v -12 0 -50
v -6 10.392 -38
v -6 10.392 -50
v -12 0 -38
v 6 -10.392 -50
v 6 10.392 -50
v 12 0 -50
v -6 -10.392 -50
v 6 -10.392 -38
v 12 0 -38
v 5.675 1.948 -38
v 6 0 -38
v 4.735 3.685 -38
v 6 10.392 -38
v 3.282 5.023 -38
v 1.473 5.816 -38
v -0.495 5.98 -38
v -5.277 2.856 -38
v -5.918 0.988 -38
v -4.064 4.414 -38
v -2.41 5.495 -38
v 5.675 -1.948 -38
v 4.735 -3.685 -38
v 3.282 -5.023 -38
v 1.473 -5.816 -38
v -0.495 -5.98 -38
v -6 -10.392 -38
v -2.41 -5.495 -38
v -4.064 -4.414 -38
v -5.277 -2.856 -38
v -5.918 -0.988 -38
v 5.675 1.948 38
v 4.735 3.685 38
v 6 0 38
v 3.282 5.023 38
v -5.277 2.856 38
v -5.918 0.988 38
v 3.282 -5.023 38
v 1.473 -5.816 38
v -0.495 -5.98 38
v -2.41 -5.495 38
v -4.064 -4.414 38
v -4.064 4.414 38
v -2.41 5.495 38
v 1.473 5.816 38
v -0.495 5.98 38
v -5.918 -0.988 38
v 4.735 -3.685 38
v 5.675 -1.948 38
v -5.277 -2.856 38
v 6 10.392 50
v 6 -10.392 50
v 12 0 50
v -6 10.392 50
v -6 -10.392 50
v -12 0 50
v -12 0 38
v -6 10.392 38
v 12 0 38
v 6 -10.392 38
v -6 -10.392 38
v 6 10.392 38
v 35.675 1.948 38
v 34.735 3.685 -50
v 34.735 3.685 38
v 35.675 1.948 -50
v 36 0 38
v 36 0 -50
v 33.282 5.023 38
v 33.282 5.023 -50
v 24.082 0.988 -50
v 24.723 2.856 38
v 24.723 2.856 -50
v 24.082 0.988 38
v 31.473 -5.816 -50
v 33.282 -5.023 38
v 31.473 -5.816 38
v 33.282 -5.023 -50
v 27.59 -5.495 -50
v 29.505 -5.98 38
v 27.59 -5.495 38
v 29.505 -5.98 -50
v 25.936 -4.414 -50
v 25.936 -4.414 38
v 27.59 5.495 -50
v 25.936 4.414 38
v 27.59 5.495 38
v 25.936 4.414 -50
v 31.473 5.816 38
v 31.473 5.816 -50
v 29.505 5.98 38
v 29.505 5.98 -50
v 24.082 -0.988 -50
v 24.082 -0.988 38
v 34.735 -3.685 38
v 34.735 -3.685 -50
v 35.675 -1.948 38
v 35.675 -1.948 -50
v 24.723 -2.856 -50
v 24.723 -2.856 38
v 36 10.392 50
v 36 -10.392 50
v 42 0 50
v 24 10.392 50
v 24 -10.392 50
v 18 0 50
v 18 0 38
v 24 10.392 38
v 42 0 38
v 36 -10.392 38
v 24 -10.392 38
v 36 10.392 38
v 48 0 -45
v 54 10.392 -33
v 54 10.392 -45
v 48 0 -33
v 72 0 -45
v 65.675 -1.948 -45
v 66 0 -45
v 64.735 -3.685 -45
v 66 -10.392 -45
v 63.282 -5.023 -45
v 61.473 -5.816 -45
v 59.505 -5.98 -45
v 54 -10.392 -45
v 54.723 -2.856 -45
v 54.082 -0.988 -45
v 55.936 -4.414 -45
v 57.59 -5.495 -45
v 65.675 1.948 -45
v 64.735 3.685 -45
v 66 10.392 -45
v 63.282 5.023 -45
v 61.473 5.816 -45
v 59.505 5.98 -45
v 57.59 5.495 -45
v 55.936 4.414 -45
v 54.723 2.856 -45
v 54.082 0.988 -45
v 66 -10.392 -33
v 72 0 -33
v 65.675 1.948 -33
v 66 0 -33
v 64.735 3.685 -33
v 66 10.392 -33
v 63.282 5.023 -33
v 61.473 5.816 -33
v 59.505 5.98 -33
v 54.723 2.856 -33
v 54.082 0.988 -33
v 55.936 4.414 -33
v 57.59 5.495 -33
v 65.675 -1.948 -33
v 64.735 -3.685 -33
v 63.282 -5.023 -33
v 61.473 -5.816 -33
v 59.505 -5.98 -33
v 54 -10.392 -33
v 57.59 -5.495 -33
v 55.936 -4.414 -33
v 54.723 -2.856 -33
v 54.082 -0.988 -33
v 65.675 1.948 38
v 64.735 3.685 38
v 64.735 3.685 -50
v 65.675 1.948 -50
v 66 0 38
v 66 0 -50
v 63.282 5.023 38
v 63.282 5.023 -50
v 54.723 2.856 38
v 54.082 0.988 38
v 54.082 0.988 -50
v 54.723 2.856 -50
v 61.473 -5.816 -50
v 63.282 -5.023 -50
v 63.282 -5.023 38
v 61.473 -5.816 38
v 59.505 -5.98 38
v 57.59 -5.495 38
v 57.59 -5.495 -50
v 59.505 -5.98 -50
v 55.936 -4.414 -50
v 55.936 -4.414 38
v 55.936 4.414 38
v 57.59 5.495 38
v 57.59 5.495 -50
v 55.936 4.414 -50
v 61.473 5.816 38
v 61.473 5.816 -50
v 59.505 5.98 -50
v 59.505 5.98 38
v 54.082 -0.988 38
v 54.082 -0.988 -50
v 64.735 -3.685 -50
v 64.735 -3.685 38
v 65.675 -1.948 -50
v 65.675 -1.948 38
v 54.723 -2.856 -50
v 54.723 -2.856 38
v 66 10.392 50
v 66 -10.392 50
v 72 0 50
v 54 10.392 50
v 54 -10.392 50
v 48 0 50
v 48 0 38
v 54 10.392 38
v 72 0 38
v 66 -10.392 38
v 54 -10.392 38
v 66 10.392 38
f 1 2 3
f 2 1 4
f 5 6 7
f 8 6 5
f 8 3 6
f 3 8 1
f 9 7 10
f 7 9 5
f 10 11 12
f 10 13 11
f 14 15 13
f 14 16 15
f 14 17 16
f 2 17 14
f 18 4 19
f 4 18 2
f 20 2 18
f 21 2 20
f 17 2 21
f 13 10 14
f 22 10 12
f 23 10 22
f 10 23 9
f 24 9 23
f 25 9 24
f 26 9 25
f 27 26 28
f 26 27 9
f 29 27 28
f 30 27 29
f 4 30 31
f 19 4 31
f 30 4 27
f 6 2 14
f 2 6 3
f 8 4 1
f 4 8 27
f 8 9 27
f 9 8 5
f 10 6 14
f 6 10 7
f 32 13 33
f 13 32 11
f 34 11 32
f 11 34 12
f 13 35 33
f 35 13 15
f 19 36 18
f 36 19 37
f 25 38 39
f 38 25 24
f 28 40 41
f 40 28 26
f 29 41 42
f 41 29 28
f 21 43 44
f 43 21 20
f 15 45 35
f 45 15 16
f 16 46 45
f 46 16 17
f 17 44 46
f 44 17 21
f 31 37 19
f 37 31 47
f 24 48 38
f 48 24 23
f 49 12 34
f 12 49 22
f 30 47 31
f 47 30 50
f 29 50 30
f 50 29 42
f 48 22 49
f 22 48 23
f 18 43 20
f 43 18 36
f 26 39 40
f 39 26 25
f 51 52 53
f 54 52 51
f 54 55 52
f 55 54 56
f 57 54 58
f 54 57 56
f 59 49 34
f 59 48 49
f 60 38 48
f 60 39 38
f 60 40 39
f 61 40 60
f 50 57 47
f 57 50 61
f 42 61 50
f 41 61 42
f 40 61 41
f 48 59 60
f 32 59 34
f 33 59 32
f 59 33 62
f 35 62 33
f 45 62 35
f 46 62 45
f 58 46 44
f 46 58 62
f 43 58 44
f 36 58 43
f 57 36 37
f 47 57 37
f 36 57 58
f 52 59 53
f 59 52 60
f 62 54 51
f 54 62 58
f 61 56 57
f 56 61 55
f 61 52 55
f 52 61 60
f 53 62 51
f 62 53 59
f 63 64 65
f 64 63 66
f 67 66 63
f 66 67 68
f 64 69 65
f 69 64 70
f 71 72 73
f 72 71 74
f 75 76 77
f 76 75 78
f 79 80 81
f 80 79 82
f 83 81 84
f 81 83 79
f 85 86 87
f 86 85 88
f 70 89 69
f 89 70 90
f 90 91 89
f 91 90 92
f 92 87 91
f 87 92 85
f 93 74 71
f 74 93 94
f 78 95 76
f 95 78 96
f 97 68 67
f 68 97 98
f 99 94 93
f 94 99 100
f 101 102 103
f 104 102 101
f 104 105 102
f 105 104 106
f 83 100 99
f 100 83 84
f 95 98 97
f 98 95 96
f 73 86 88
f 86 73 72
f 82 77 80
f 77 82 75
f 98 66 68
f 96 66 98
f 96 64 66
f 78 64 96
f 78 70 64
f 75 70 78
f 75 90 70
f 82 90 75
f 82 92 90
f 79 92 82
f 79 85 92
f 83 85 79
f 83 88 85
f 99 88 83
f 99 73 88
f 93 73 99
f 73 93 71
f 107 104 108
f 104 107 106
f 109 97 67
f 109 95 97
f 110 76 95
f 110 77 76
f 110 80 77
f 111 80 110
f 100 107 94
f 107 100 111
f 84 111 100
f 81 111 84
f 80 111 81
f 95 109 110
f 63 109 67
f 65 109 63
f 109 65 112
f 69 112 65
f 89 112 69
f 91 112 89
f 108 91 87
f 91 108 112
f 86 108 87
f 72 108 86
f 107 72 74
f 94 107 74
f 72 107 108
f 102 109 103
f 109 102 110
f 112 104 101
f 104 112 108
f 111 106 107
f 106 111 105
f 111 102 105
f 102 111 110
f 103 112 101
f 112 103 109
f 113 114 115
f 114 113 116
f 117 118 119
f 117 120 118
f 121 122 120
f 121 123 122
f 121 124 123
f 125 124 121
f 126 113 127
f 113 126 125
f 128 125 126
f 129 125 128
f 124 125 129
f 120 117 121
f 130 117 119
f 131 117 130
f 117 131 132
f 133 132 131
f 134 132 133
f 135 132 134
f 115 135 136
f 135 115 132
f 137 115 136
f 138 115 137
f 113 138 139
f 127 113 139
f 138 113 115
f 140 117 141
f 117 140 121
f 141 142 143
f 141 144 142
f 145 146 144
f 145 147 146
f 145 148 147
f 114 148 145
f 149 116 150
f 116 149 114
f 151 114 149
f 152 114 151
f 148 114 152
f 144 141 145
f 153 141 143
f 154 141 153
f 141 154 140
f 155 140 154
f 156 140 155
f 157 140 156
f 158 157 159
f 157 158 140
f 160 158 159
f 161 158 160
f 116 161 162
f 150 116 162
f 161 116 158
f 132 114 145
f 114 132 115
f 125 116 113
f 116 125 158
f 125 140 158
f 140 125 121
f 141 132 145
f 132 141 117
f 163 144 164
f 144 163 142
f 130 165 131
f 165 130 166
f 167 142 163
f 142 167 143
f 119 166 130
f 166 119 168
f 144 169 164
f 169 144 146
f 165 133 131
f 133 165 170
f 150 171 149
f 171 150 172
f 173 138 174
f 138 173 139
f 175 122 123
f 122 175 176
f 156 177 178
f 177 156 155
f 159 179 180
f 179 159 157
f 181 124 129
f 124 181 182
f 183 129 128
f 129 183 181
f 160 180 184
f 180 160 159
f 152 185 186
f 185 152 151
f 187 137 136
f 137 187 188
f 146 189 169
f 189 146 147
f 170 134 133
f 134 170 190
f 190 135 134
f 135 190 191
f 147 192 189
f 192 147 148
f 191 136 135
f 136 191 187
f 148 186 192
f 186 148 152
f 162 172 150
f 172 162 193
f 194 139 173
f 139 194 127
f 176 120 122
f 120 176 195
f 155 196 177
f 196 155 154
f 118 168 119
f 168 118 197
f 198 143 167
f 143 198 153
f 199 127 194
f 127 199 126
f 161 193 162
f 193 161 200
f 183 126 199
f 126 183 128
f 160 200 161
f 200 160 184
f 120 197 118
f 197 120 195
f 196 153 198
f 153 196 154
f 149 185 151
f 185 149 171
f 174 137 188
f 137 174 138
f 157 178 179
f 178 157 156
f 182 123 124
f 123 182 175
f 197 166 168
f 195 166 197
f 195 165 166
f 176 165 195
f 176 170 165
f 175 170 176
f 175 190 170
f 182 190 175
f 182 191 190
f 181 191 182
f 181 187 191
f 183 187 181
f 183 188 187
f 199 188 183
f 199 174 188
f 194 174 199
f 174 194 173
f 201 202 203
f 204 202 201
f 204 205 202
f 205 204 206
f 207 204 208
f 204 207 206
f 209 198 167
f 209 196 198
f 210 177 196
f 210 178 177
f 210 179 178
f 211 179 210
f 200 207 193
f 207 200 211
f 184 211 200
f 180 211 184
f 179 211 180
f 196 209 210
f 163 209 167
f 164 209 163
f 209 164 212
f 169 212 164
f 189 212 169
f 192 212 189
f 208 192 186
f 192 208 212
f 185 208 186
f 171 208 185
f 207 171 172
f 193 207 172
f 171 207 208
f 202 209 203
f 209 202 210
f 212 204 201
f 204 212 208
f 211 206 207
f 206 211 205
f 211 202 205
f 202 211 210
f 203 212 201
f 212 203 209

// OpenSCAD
// file: metric_nut.scad
// include <../../config.scad>;
use <./beam_hexagonal.scad>;
use <./metric_bolt_functions.scad>;

module metric_nut(size, centre = true) {
    height = get_metric_bolt_head_height(size);
    diameter = get_metric_bolt_head_diameter(size);
    radius = diameter / 2;
    color("gray") difference() {
        // body
        beam_hexagonal(height, diameter, centre = centre, suppress_shopping_outputs = true);
        // hole
        cylinder(height, size / 2, size / 2, center = centre);
    }
    // Shopping
    echo(str("Nut: Nut M", size, " - x1"));
}

// $fn = 200;
metric_nut(12);
// file: metric_bolt_functions.scad
function get_metric_bolt_head_height(size) = size;
function get_metric_bolt_head_diameter(size) = size * 2;
function get_metric_bolt_washer_diameter_safe_working_clearance(size) = 
    (size < 20) ?
        4 * size
    :
        3 * size
;
// file: beam_hexagonal.scad
// include <../../config.scad>;

module beam_hexagonal(L, d, centre = true, suppress_shopping_outputs = false) {
    radius = d / 2;
    linear_extrude(L, center = centre) polygon([[radius, 0], [radius * cos(60), radius * sin(60)], [radius * cos(120), radius * sin(120)], [radius * cos(180), radius * sin(180)], [radius * cos(240), radius * sin(240)], [radius * cos(300), radius * sin(300)]]);
    // Shopping
    if (!suppress_shopping_outputs) {
        echo(str("Hexagonal beam: Hexagonal beam Φ", d, "mm x ", L, "mm - x1"));
    }
}

// $fn = 200;
beam_hexagonal(500, 50);
// main file
// include <../../config.scad>;
use <./beam_hexagonal.scad>;
use <./metric_bolt_functions.scad>;
use <./metric_nut.scad>;

module metric_bolt(size, length, has_nut = true, offset_nut_from_end = 0) {
    echo("Metric bolt assembly:");
    head_height = get_metric_bolt_head_height(size);
    head_diameter = get_metric_bolt_head_diameter(size);
    head_radius = head_diameter / 2;
    color("gray") union() {
        // Stem
        cylinder(length, size / 2, size / 2, center = true);
        // Head
        translate([0, 0, length / 2 - size / 2]) beam_hexagonal(head_height, head_diameter, centre = true, suppress_shopping_outputs = true);
        if (has_nut) {
            // Nut
            translate([0, 0, -(length / 2 - size / 2) + offset_nut_from_end]) metric_nut(size);
        }
    }
    // Shopping
    echo(str("Bolt: Bolt M", size, " x ", length, "mm - x1"));
}

// $fn = 200;
metric_bolt(12, 100);
translate([30, 0, 0]) metric_bolt(12, 100, false);
translate([60, 0, 0]) metric_bolt(12, 100, true, 5);
